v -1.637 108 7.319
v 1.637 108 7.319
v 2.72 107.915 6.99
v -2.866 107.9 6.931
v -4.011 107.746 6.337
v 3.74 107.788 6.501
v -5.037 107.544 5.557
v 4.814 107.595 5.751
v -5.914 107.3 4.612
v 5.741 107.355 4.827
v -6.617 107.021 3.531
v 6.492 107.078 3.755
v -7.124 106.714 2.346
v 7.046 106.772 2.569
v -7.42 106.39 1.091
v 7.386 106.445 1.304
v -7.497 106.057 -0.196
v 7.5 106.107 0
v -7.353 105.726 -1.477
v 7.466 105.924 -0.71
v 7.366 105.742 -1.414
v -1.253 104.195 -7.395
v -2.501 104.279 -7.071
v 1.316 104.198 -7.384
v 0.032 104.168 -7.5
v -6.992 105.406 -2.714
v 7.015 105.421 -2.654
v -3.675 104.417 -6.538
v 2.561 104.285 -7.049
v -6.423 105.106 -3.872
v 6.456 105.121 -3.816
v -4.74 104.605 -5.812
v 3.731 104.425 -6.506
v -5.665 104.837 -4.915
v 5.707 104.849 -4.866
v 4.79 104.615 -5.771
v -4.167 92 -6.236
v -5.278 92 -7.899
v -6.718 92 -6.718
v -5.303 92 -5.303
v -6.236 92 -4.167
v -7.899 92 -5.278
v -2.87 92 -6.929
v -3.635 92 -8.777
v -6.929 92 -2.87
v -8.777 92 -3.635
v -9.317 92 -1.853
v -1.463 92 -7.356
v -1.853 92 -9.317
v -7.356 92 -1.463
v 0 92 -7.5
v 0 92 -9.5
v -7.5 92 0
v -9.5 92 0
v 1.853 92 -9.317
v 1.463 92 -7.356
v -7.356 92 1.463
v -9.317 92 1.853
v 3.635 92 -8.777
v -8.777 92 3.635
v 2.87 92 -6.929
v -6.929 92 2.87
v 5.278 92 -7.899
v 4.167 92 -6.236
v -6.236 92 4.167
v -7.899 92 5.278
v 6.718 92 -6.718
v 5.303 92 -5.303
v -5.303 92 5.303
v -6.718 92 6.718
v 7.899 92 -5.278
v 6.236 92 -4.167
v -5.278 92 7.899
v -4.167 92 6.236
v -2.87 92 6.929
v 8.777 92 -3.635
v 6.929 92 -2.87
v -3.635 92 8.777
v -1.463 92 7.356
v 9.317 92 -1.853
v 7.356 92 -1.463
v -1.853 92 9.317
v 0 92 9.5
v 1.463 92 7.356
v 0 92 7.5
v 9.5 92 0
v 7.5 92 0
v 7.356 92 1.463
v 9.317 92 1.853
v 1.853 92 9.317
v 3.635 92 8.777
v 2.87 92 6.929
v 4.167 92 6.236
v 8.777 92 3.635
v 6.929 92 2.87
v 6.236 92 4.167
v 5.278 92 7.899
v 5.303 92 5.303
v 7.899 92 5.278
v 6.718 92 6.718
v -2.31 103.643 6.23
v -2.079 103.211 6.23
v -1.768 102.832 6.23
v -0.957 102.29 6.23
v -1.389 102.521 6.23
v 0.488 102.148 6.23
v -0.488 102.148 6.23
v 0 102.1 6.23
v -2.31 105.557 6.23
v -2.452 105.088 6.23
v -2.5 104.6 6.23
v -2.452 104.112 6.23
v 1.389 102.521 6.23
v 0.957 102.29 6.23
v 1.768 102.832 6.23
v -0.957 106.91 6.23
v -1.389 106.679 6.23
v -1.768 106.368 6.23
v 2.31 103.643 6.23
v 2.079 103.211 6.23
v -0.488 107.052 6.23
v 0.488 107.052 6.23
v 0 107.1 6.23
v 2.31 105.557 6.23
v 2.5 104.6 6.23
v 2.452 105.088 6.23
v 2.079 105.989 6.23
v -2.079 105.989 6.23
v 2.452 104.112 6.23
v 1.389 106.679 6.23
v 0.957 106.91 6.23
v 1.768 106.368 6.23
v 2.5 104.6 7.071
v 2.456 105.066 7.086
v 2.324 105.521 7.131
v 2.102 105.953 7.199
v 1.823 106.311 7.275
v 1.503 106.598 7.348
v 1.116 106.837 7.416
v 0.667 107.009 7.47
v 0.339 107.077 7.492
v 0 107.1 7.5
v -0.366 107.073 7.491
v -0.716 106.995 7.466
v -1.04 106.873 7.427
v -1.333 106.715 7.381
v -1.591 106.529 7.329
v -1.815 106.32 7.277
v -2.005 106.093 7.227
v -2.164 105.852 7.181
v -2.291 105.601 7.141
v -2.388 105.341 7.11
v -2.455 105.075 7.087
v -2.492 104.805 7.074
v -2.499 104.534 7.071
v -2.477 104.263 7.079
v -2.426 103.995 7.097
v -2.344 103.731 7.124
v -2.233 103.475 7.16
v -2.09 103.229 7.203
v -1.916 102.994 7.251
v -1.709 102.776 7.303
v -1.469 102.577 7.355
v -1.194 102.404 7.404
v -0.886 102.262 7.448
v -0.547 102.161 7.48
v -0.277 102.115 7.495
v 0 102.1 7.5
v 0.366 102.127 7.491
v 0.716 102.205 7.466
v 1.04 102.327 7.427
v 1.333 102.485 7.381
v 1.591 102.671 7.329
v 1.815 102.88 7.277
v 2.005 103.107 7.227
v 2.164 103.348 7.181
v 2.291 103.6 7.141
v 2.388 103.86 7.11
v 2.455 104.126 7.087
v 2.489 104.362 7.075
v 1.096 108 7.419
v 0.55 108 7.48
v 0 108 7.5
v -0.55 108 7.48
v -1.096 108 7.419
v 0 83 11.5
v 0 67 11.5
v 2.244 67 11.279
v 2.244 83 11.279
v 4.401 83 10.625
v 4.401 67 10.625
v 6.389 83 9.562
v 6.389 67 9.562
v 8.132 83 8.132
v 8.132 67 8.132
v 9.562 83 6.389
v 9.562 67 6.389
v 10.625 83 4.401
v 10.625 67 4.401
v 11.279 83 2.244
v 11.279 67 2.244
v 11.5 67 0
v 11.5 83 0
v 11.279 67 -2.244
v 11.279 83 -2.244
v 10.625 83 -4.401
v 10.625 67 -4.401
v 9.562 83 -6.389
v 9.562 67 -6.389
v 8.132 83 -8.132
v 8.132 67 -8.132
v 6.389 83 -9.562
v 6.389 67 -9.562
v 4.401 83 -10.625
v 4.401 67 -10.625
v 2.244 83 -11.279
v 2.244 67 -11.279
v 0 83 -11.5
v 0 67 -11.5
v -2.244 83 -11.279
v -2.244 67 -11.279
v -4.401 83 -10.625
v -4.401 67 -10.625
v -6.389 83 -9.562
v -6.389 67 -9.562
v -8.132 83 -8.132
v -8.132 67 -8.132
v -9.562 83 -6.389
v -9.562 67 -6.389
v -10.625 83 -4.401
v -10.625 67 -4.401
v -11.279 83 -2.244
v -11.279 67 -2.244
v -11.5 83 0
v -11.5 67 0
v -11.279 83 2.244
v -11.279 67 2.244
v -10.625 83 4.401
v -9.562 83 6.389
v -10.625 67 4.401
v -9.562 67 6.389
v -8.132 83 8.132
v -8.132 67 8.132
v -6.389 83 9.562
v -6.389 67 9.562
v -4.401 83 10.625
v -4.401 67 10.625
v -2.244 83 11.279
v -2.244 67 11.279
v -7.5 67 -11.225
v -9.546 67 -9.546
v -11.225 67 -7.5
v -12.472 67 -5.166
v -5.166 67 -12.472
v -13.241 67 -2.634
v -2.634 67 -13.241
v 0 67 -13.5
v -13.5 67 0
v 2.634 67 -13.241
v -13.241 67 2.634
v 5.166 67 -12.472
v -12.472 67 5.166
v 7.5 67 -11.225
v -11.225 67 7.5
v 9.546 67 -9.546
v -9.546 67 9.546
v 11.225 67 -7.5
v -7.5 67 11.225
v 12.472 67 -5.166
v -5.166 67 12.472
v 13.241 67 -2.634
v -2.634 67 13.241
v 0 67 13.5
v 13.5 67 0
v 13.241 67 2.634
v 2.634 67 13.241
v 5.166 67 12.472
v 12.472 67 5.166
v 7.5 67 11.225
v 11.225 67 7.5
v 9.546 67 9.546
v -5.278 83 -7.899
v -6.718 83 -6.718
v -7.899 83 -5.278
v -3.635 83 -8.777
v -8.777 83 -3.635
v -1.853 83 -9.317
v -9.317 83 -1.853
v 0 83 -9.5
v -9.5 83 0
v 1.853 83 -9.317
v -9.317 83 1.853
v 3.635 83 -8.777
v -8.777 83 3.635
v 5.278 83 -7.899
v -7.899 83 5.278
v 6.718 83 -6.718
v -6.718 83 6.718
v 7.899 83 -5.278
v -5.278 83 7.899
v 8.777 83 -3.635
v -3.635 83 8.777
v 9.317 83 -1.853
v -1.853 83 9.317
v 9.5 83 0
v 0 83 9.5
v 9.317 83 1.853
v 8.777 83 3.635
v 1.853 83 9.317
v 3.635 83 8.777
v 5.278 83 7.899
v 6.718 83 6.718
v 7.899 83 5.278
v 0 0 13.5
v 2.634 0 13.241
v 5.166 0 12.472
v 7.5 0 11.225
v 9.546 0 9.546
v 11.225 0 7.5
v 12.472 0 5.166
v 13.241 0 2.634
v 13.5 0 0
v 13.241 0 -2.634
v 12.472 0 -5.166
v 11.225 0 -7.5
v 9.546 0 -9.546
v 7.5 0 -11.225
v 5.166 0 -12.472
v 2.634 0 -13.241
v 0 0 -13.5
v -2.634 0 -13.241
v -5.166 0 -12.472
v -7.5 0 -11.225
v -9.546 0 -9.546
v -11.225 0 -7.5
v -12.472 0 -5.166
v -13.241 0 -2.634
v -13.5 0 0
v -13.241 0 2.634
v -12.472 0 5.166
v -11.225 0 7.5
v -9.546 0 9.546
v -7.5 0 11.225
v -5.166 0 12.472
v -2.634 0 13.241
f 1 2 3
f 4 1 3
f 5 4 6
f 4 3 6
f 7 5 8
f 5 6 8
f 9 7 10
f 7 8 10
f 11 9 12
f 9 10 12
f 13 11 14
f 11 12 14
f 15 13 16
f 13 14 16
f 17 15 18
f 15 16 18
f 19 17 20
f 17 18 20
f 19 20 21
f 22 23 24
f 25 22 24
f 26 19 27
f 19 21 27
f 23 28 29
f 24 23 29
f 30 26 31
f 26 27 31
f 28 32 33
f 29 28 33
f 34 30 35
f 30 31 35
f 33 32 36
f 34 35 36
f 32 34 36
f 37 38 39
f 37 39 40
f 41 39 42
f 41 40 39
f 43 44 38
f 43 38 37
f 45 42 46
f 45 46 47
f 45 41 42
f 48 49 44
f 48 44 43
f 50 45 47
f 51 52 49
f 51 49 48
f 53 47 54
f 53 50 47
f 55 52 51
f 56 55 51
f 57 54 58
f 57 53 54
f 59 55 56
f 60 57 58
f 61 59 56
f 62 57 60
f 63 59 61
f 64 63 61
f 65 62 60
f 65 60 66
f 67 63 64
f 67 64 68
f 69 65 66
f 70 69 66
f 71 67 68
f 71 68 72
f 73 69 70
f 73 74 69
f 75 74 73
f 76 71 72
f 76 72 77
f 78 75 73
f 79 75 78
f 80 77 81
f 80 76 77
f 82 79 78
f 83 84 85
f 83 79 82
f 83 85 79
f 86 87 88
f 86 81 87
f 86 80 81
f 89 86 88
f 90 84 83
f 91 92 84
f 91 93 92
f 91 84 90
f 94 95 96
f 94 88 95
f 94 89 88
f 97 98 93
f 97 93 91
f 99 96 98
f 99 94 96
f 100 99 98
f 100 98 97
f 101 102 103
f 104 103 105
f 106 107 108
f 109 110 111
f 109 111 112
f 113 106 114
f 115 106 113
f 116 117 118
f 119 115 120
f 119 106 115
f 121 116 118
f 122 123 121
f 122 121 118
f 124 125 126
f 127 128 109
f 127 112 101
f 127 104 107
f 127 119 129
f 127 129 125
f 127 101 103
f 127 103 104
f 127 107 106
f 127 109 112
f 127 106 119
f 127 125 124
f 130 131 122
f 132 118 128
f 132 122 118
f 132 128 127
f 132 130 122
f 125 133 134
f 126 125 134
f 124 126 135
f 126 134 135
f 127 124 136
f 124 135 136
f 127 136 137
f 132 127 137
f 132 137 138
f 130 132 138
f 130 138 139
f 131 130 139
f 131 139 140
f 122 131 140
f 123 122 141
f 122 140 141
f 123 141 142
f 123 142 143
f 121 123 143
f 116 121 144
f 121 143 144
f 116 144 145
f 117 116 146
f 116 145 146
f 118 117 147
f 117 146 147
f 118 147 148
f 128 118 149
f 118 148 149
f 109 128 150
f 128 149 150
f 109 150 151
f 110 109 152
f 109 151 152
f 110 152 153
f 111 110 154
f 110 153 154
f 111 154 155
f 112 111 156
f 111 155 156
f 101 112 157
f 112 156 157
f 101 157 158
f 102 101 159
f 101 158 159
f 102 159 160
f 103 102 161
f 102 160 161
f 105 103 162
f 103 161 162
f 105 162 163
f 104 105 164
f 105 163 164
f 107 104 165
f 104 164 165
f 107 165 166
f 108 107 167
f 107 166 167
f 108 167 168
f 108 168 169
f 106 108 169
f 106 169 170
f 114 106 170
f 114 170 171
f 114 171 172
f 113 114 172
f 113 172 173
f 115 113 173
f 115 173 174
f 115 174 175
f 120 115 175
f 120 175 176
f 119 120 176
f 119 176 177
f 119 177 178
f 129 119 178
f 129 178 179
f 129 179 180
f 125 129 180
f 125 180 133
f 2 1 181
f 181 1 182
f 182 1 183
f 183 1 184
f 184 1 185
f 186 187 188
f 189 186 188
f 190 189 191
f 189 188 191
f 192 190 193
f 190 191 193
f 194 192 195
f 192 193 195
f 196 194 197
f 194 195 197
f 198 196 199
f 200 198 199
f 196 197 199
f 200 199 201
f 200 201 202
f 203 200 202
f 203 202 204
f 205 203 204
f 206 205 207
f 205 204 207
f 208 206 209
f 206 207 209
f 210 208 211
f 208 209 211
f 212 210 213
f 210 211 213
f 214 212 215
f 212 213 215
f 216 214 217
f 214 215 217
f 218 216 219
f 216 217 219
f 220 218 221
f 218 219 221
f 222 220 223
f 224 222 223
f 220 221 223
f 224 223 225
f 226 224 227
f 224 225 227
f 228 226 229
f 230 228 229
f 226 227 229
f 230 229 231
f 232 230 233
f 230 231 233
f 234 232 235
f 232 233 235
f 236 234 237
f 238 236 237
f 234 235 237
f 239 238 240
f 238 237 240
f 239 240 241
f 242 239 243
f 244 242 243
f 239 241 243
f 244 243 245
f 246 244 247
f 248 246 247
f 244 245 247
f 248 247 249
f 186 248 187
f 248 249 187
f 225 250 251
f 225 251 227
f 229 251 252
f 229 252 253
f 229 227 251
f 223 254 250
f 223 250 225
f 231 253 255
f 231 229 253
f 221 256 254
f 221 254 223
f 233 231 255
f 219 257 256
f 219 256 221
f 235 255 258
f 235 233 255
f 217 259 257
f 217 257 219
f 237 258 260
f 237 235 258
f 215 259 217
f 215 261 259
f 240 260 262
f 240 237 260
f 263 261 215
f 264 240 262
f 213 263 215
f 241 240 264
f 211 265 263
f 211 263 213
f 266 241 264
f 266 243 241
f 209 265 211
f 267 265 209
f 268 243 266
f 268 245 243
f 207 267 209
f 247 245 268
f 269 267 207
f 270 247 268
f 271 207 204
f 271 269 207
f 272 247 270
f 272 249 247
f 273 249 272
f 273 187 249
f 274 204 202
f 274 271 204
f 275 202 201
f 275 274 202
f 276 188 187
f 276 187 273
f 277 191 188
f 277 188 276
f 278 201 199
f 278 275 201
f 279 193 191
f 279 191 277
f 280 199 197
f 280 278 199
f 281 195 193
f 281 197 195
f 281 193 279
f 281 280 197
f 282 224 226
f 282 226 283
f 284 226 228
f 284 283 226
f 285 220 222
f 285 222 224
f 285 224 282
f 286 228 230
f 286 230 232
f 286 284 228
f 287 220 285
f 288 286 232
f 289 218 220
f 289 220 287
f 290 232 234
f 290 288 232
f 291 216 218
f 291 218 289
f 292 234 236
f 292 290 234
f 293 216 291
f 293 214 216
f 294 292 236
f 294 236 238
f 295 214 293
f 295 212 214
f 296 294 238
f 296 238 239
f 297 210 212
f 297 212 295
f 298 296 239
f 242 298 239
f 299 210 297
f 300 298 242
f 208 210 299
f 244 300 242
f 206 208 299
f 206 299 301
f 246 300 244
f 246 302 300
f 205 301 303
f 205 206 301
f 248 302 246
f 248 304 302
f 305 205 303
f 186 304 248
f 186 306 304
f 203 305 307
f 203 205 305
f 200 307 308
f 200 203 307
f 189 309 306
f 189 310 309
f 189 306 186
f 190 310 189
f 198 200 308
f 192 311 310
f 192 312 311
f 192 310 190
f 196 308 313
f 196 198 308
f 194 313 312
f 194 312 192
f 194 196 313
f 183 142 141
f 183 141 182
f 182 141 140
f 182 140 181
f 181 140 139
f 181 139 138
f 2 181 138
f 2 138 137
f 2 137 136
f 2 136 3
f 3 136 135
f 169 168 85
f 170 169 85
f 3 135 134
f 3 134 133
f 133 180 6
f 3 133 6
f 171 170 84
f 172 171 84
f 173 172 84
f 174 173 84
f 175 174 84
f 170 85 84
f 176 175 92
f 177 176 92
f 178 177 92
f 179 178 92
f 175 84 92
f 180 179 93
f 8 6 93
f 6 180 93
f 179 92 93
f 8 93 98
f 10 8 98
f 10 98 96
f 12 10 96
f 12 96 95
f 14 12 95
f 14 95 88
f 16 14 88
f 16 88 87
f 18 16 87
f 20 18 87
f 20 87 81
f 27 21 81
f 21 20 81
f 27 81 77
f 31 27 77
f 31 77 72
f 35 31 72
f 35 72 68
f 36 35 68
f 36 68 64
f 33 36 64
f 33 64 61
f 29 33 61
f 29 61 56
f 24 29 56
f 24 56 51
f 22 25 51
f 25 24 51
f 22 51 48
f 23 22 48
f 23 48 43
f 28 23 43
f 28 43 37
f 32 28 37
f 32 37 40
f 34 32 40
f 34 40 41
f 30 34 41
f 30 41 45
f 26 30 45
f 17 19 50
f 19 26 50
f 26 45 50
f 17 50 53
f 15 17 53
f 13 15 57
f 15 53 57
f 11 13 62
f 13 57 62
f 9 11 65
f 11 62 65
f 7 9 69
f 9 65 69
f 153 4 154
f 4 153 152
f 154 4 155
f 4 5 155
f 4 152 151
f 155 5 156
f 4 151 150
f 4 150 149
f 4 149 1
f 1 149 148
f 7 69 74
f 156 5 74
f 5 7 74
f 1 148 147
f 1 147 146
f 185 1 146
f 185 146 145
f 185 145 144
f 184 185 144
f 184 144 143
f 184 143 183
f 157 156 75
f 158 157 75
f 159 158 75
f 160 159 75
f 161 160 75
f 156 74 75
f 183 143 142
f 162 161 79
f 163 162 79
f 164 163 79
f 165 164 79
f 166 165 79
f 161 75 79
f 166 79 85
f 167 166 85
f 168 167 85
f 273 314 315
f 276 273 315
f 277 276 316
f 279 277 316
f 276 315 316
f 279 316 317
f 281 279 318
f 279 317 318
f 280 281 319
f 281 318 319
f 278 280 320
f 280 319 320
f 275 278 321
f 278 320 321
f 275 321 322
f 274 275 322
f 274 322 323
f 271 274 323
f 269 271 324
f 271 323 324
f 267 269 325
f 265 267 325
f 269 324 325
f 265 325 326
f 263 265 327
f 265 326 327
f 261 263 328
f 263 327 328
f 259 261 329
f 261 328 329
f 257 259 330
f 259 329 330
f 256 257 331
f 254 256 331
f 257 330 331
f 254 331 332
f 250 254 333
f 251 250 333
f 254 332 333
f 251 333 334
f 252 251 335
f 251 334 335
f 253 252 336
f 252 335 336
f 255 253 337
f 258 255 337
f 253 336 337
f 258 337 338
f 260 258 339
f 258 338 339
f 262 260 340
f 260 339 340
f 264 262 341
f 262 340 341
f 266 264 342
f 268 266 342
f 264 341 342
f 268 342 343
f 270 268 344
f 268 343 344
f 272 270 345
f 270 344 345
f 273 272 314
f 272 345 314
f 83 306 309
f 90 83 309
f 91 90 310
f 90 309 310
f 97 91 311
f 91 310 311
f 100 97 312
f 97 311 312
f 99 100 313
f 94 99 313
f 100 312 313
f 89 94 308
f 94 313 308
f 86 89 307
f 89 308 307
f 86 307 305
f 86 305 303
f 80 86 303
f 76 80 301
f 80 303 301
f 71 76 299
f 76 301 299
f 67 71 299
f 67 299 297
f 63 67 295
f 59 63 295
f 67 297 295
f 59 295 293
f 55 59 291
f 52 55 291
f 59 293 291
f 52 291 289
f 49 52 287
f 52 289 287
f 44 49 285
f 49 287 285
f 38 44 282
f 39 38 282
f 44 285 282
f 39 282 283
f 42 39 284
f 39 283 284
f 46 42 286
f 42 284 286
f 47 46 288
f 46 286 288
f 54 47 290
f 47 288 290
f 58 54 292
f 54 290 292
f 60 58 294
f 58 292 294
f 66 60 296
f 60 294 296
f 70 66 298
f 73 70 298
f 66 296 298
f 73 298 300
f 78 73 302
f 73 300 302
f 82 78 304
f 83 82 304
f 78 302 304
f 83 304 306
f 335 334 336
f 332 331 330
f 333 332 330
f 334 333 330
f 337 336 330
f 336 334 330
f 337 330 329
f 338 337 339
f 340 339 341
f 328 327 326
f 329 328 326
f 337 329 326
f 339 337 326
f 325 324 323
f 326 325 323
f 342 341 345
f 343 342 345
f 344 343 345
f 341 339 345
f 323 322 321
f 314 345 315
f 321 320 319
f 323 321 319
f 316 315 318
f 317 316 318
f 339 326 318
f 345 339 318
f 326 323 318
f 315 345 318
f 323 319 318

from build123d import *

# Parameters (mm, degrees)
SKETCH1_R           = 13.5
BOSS_EXTRUDE1_DEPTH = 67
SKETCH2_R           = 11.5
BOSS_EXTRUDE2_DEPTH = 16
SKETCH3_R           = 9.5
BOSS_EXTRUDE3_DEPTH = 9
SKETCH4_R           = 7.5
BOSS_EXTRUDE4_DEPTH = 16
CUT_EXTRUDE1_DEPTH  = 111.847868721
SKETCH7_R           = 2.5
CUT_EXTRUDE2_DEPTH  = 1.27


with BuildPart() as part:
    # Sketch1 → Boss-Extrude1 (new body)
    with BuildSketch(Plane(origin=(0, 0, 0), x_dir=(1, 0, 0), z_dir=(0, 1, 0))):
        with Locations(Location((0, 0, 0), (0, 0, 270))):
            Circle(SKETCH1_R)
    extrude(amount=BOSS_EXTRUDE1_DEPTH)

    # Sketch2 → Boss-Extrude2 (add)
    with BuildSketch(Plane(origin=(0, 67, 0), x_dir=(1, 0, 0), z_dir=(0, 1, 0))):
        with Locations(Location((0, 0, 0), (0, 0, 270))):
            Circle(SKETCH2_R)
    extrude(amount=BOSS_EXTRUDE2_DEPTH)

    # Sketch3 → Boss-Extrude3 (add)
    with BuildSketch(Plane(origin=(0, 83, 0), x_dir=(1, 0, 0), z_dir=(0, 1, 0))):
        with Locations(Location((0, 0, 0), (0, 0, 270))):
            Circle(SKETCH3_R)
    extrude(amount=BOSS_EXTRUDE3_DEPTH)

    # Sketch4 → Boss-Extrude4 (add)
    with BuildSketch(Plane(origin=(0, 92, 0), x_dir=(1, 0, 0), z_dir=(0, 1, 0))):
        with Locations(Location((0, 0, 0), (0, 0, 270))):
            Circle(SKETCH4_R)
    extrude(amount=BOSS_EXTRUDE4_DEPTH)

    # Sketch6 → Cut-Extrude1 (cut, through all)
    with BuildSketch(Plane(origin=(7.5, 0, 0), x_dir=(0, 0, -1), z_dir=(1, 0, 0))):
        Polygon((-7.319182821, 108), (8.150119574, 104), (7.994537509, 108), align=None)
    extrude(amount=-CUT_EXTRUDE1_DEPTH, mode=Mode.SUBTRACT)

    # Sketch7 → Cut-Extrude2 (cut)
    with BuildSketch(Plane.XY.offset(7.5)):
        with Locations((0, 104.6)):
            Circle(SKETCH7_R)
    extrude(amount=-CUT_EXTRUDE2_DEPTH, mode=Mode.SUBTRACT)


solid = part.part
